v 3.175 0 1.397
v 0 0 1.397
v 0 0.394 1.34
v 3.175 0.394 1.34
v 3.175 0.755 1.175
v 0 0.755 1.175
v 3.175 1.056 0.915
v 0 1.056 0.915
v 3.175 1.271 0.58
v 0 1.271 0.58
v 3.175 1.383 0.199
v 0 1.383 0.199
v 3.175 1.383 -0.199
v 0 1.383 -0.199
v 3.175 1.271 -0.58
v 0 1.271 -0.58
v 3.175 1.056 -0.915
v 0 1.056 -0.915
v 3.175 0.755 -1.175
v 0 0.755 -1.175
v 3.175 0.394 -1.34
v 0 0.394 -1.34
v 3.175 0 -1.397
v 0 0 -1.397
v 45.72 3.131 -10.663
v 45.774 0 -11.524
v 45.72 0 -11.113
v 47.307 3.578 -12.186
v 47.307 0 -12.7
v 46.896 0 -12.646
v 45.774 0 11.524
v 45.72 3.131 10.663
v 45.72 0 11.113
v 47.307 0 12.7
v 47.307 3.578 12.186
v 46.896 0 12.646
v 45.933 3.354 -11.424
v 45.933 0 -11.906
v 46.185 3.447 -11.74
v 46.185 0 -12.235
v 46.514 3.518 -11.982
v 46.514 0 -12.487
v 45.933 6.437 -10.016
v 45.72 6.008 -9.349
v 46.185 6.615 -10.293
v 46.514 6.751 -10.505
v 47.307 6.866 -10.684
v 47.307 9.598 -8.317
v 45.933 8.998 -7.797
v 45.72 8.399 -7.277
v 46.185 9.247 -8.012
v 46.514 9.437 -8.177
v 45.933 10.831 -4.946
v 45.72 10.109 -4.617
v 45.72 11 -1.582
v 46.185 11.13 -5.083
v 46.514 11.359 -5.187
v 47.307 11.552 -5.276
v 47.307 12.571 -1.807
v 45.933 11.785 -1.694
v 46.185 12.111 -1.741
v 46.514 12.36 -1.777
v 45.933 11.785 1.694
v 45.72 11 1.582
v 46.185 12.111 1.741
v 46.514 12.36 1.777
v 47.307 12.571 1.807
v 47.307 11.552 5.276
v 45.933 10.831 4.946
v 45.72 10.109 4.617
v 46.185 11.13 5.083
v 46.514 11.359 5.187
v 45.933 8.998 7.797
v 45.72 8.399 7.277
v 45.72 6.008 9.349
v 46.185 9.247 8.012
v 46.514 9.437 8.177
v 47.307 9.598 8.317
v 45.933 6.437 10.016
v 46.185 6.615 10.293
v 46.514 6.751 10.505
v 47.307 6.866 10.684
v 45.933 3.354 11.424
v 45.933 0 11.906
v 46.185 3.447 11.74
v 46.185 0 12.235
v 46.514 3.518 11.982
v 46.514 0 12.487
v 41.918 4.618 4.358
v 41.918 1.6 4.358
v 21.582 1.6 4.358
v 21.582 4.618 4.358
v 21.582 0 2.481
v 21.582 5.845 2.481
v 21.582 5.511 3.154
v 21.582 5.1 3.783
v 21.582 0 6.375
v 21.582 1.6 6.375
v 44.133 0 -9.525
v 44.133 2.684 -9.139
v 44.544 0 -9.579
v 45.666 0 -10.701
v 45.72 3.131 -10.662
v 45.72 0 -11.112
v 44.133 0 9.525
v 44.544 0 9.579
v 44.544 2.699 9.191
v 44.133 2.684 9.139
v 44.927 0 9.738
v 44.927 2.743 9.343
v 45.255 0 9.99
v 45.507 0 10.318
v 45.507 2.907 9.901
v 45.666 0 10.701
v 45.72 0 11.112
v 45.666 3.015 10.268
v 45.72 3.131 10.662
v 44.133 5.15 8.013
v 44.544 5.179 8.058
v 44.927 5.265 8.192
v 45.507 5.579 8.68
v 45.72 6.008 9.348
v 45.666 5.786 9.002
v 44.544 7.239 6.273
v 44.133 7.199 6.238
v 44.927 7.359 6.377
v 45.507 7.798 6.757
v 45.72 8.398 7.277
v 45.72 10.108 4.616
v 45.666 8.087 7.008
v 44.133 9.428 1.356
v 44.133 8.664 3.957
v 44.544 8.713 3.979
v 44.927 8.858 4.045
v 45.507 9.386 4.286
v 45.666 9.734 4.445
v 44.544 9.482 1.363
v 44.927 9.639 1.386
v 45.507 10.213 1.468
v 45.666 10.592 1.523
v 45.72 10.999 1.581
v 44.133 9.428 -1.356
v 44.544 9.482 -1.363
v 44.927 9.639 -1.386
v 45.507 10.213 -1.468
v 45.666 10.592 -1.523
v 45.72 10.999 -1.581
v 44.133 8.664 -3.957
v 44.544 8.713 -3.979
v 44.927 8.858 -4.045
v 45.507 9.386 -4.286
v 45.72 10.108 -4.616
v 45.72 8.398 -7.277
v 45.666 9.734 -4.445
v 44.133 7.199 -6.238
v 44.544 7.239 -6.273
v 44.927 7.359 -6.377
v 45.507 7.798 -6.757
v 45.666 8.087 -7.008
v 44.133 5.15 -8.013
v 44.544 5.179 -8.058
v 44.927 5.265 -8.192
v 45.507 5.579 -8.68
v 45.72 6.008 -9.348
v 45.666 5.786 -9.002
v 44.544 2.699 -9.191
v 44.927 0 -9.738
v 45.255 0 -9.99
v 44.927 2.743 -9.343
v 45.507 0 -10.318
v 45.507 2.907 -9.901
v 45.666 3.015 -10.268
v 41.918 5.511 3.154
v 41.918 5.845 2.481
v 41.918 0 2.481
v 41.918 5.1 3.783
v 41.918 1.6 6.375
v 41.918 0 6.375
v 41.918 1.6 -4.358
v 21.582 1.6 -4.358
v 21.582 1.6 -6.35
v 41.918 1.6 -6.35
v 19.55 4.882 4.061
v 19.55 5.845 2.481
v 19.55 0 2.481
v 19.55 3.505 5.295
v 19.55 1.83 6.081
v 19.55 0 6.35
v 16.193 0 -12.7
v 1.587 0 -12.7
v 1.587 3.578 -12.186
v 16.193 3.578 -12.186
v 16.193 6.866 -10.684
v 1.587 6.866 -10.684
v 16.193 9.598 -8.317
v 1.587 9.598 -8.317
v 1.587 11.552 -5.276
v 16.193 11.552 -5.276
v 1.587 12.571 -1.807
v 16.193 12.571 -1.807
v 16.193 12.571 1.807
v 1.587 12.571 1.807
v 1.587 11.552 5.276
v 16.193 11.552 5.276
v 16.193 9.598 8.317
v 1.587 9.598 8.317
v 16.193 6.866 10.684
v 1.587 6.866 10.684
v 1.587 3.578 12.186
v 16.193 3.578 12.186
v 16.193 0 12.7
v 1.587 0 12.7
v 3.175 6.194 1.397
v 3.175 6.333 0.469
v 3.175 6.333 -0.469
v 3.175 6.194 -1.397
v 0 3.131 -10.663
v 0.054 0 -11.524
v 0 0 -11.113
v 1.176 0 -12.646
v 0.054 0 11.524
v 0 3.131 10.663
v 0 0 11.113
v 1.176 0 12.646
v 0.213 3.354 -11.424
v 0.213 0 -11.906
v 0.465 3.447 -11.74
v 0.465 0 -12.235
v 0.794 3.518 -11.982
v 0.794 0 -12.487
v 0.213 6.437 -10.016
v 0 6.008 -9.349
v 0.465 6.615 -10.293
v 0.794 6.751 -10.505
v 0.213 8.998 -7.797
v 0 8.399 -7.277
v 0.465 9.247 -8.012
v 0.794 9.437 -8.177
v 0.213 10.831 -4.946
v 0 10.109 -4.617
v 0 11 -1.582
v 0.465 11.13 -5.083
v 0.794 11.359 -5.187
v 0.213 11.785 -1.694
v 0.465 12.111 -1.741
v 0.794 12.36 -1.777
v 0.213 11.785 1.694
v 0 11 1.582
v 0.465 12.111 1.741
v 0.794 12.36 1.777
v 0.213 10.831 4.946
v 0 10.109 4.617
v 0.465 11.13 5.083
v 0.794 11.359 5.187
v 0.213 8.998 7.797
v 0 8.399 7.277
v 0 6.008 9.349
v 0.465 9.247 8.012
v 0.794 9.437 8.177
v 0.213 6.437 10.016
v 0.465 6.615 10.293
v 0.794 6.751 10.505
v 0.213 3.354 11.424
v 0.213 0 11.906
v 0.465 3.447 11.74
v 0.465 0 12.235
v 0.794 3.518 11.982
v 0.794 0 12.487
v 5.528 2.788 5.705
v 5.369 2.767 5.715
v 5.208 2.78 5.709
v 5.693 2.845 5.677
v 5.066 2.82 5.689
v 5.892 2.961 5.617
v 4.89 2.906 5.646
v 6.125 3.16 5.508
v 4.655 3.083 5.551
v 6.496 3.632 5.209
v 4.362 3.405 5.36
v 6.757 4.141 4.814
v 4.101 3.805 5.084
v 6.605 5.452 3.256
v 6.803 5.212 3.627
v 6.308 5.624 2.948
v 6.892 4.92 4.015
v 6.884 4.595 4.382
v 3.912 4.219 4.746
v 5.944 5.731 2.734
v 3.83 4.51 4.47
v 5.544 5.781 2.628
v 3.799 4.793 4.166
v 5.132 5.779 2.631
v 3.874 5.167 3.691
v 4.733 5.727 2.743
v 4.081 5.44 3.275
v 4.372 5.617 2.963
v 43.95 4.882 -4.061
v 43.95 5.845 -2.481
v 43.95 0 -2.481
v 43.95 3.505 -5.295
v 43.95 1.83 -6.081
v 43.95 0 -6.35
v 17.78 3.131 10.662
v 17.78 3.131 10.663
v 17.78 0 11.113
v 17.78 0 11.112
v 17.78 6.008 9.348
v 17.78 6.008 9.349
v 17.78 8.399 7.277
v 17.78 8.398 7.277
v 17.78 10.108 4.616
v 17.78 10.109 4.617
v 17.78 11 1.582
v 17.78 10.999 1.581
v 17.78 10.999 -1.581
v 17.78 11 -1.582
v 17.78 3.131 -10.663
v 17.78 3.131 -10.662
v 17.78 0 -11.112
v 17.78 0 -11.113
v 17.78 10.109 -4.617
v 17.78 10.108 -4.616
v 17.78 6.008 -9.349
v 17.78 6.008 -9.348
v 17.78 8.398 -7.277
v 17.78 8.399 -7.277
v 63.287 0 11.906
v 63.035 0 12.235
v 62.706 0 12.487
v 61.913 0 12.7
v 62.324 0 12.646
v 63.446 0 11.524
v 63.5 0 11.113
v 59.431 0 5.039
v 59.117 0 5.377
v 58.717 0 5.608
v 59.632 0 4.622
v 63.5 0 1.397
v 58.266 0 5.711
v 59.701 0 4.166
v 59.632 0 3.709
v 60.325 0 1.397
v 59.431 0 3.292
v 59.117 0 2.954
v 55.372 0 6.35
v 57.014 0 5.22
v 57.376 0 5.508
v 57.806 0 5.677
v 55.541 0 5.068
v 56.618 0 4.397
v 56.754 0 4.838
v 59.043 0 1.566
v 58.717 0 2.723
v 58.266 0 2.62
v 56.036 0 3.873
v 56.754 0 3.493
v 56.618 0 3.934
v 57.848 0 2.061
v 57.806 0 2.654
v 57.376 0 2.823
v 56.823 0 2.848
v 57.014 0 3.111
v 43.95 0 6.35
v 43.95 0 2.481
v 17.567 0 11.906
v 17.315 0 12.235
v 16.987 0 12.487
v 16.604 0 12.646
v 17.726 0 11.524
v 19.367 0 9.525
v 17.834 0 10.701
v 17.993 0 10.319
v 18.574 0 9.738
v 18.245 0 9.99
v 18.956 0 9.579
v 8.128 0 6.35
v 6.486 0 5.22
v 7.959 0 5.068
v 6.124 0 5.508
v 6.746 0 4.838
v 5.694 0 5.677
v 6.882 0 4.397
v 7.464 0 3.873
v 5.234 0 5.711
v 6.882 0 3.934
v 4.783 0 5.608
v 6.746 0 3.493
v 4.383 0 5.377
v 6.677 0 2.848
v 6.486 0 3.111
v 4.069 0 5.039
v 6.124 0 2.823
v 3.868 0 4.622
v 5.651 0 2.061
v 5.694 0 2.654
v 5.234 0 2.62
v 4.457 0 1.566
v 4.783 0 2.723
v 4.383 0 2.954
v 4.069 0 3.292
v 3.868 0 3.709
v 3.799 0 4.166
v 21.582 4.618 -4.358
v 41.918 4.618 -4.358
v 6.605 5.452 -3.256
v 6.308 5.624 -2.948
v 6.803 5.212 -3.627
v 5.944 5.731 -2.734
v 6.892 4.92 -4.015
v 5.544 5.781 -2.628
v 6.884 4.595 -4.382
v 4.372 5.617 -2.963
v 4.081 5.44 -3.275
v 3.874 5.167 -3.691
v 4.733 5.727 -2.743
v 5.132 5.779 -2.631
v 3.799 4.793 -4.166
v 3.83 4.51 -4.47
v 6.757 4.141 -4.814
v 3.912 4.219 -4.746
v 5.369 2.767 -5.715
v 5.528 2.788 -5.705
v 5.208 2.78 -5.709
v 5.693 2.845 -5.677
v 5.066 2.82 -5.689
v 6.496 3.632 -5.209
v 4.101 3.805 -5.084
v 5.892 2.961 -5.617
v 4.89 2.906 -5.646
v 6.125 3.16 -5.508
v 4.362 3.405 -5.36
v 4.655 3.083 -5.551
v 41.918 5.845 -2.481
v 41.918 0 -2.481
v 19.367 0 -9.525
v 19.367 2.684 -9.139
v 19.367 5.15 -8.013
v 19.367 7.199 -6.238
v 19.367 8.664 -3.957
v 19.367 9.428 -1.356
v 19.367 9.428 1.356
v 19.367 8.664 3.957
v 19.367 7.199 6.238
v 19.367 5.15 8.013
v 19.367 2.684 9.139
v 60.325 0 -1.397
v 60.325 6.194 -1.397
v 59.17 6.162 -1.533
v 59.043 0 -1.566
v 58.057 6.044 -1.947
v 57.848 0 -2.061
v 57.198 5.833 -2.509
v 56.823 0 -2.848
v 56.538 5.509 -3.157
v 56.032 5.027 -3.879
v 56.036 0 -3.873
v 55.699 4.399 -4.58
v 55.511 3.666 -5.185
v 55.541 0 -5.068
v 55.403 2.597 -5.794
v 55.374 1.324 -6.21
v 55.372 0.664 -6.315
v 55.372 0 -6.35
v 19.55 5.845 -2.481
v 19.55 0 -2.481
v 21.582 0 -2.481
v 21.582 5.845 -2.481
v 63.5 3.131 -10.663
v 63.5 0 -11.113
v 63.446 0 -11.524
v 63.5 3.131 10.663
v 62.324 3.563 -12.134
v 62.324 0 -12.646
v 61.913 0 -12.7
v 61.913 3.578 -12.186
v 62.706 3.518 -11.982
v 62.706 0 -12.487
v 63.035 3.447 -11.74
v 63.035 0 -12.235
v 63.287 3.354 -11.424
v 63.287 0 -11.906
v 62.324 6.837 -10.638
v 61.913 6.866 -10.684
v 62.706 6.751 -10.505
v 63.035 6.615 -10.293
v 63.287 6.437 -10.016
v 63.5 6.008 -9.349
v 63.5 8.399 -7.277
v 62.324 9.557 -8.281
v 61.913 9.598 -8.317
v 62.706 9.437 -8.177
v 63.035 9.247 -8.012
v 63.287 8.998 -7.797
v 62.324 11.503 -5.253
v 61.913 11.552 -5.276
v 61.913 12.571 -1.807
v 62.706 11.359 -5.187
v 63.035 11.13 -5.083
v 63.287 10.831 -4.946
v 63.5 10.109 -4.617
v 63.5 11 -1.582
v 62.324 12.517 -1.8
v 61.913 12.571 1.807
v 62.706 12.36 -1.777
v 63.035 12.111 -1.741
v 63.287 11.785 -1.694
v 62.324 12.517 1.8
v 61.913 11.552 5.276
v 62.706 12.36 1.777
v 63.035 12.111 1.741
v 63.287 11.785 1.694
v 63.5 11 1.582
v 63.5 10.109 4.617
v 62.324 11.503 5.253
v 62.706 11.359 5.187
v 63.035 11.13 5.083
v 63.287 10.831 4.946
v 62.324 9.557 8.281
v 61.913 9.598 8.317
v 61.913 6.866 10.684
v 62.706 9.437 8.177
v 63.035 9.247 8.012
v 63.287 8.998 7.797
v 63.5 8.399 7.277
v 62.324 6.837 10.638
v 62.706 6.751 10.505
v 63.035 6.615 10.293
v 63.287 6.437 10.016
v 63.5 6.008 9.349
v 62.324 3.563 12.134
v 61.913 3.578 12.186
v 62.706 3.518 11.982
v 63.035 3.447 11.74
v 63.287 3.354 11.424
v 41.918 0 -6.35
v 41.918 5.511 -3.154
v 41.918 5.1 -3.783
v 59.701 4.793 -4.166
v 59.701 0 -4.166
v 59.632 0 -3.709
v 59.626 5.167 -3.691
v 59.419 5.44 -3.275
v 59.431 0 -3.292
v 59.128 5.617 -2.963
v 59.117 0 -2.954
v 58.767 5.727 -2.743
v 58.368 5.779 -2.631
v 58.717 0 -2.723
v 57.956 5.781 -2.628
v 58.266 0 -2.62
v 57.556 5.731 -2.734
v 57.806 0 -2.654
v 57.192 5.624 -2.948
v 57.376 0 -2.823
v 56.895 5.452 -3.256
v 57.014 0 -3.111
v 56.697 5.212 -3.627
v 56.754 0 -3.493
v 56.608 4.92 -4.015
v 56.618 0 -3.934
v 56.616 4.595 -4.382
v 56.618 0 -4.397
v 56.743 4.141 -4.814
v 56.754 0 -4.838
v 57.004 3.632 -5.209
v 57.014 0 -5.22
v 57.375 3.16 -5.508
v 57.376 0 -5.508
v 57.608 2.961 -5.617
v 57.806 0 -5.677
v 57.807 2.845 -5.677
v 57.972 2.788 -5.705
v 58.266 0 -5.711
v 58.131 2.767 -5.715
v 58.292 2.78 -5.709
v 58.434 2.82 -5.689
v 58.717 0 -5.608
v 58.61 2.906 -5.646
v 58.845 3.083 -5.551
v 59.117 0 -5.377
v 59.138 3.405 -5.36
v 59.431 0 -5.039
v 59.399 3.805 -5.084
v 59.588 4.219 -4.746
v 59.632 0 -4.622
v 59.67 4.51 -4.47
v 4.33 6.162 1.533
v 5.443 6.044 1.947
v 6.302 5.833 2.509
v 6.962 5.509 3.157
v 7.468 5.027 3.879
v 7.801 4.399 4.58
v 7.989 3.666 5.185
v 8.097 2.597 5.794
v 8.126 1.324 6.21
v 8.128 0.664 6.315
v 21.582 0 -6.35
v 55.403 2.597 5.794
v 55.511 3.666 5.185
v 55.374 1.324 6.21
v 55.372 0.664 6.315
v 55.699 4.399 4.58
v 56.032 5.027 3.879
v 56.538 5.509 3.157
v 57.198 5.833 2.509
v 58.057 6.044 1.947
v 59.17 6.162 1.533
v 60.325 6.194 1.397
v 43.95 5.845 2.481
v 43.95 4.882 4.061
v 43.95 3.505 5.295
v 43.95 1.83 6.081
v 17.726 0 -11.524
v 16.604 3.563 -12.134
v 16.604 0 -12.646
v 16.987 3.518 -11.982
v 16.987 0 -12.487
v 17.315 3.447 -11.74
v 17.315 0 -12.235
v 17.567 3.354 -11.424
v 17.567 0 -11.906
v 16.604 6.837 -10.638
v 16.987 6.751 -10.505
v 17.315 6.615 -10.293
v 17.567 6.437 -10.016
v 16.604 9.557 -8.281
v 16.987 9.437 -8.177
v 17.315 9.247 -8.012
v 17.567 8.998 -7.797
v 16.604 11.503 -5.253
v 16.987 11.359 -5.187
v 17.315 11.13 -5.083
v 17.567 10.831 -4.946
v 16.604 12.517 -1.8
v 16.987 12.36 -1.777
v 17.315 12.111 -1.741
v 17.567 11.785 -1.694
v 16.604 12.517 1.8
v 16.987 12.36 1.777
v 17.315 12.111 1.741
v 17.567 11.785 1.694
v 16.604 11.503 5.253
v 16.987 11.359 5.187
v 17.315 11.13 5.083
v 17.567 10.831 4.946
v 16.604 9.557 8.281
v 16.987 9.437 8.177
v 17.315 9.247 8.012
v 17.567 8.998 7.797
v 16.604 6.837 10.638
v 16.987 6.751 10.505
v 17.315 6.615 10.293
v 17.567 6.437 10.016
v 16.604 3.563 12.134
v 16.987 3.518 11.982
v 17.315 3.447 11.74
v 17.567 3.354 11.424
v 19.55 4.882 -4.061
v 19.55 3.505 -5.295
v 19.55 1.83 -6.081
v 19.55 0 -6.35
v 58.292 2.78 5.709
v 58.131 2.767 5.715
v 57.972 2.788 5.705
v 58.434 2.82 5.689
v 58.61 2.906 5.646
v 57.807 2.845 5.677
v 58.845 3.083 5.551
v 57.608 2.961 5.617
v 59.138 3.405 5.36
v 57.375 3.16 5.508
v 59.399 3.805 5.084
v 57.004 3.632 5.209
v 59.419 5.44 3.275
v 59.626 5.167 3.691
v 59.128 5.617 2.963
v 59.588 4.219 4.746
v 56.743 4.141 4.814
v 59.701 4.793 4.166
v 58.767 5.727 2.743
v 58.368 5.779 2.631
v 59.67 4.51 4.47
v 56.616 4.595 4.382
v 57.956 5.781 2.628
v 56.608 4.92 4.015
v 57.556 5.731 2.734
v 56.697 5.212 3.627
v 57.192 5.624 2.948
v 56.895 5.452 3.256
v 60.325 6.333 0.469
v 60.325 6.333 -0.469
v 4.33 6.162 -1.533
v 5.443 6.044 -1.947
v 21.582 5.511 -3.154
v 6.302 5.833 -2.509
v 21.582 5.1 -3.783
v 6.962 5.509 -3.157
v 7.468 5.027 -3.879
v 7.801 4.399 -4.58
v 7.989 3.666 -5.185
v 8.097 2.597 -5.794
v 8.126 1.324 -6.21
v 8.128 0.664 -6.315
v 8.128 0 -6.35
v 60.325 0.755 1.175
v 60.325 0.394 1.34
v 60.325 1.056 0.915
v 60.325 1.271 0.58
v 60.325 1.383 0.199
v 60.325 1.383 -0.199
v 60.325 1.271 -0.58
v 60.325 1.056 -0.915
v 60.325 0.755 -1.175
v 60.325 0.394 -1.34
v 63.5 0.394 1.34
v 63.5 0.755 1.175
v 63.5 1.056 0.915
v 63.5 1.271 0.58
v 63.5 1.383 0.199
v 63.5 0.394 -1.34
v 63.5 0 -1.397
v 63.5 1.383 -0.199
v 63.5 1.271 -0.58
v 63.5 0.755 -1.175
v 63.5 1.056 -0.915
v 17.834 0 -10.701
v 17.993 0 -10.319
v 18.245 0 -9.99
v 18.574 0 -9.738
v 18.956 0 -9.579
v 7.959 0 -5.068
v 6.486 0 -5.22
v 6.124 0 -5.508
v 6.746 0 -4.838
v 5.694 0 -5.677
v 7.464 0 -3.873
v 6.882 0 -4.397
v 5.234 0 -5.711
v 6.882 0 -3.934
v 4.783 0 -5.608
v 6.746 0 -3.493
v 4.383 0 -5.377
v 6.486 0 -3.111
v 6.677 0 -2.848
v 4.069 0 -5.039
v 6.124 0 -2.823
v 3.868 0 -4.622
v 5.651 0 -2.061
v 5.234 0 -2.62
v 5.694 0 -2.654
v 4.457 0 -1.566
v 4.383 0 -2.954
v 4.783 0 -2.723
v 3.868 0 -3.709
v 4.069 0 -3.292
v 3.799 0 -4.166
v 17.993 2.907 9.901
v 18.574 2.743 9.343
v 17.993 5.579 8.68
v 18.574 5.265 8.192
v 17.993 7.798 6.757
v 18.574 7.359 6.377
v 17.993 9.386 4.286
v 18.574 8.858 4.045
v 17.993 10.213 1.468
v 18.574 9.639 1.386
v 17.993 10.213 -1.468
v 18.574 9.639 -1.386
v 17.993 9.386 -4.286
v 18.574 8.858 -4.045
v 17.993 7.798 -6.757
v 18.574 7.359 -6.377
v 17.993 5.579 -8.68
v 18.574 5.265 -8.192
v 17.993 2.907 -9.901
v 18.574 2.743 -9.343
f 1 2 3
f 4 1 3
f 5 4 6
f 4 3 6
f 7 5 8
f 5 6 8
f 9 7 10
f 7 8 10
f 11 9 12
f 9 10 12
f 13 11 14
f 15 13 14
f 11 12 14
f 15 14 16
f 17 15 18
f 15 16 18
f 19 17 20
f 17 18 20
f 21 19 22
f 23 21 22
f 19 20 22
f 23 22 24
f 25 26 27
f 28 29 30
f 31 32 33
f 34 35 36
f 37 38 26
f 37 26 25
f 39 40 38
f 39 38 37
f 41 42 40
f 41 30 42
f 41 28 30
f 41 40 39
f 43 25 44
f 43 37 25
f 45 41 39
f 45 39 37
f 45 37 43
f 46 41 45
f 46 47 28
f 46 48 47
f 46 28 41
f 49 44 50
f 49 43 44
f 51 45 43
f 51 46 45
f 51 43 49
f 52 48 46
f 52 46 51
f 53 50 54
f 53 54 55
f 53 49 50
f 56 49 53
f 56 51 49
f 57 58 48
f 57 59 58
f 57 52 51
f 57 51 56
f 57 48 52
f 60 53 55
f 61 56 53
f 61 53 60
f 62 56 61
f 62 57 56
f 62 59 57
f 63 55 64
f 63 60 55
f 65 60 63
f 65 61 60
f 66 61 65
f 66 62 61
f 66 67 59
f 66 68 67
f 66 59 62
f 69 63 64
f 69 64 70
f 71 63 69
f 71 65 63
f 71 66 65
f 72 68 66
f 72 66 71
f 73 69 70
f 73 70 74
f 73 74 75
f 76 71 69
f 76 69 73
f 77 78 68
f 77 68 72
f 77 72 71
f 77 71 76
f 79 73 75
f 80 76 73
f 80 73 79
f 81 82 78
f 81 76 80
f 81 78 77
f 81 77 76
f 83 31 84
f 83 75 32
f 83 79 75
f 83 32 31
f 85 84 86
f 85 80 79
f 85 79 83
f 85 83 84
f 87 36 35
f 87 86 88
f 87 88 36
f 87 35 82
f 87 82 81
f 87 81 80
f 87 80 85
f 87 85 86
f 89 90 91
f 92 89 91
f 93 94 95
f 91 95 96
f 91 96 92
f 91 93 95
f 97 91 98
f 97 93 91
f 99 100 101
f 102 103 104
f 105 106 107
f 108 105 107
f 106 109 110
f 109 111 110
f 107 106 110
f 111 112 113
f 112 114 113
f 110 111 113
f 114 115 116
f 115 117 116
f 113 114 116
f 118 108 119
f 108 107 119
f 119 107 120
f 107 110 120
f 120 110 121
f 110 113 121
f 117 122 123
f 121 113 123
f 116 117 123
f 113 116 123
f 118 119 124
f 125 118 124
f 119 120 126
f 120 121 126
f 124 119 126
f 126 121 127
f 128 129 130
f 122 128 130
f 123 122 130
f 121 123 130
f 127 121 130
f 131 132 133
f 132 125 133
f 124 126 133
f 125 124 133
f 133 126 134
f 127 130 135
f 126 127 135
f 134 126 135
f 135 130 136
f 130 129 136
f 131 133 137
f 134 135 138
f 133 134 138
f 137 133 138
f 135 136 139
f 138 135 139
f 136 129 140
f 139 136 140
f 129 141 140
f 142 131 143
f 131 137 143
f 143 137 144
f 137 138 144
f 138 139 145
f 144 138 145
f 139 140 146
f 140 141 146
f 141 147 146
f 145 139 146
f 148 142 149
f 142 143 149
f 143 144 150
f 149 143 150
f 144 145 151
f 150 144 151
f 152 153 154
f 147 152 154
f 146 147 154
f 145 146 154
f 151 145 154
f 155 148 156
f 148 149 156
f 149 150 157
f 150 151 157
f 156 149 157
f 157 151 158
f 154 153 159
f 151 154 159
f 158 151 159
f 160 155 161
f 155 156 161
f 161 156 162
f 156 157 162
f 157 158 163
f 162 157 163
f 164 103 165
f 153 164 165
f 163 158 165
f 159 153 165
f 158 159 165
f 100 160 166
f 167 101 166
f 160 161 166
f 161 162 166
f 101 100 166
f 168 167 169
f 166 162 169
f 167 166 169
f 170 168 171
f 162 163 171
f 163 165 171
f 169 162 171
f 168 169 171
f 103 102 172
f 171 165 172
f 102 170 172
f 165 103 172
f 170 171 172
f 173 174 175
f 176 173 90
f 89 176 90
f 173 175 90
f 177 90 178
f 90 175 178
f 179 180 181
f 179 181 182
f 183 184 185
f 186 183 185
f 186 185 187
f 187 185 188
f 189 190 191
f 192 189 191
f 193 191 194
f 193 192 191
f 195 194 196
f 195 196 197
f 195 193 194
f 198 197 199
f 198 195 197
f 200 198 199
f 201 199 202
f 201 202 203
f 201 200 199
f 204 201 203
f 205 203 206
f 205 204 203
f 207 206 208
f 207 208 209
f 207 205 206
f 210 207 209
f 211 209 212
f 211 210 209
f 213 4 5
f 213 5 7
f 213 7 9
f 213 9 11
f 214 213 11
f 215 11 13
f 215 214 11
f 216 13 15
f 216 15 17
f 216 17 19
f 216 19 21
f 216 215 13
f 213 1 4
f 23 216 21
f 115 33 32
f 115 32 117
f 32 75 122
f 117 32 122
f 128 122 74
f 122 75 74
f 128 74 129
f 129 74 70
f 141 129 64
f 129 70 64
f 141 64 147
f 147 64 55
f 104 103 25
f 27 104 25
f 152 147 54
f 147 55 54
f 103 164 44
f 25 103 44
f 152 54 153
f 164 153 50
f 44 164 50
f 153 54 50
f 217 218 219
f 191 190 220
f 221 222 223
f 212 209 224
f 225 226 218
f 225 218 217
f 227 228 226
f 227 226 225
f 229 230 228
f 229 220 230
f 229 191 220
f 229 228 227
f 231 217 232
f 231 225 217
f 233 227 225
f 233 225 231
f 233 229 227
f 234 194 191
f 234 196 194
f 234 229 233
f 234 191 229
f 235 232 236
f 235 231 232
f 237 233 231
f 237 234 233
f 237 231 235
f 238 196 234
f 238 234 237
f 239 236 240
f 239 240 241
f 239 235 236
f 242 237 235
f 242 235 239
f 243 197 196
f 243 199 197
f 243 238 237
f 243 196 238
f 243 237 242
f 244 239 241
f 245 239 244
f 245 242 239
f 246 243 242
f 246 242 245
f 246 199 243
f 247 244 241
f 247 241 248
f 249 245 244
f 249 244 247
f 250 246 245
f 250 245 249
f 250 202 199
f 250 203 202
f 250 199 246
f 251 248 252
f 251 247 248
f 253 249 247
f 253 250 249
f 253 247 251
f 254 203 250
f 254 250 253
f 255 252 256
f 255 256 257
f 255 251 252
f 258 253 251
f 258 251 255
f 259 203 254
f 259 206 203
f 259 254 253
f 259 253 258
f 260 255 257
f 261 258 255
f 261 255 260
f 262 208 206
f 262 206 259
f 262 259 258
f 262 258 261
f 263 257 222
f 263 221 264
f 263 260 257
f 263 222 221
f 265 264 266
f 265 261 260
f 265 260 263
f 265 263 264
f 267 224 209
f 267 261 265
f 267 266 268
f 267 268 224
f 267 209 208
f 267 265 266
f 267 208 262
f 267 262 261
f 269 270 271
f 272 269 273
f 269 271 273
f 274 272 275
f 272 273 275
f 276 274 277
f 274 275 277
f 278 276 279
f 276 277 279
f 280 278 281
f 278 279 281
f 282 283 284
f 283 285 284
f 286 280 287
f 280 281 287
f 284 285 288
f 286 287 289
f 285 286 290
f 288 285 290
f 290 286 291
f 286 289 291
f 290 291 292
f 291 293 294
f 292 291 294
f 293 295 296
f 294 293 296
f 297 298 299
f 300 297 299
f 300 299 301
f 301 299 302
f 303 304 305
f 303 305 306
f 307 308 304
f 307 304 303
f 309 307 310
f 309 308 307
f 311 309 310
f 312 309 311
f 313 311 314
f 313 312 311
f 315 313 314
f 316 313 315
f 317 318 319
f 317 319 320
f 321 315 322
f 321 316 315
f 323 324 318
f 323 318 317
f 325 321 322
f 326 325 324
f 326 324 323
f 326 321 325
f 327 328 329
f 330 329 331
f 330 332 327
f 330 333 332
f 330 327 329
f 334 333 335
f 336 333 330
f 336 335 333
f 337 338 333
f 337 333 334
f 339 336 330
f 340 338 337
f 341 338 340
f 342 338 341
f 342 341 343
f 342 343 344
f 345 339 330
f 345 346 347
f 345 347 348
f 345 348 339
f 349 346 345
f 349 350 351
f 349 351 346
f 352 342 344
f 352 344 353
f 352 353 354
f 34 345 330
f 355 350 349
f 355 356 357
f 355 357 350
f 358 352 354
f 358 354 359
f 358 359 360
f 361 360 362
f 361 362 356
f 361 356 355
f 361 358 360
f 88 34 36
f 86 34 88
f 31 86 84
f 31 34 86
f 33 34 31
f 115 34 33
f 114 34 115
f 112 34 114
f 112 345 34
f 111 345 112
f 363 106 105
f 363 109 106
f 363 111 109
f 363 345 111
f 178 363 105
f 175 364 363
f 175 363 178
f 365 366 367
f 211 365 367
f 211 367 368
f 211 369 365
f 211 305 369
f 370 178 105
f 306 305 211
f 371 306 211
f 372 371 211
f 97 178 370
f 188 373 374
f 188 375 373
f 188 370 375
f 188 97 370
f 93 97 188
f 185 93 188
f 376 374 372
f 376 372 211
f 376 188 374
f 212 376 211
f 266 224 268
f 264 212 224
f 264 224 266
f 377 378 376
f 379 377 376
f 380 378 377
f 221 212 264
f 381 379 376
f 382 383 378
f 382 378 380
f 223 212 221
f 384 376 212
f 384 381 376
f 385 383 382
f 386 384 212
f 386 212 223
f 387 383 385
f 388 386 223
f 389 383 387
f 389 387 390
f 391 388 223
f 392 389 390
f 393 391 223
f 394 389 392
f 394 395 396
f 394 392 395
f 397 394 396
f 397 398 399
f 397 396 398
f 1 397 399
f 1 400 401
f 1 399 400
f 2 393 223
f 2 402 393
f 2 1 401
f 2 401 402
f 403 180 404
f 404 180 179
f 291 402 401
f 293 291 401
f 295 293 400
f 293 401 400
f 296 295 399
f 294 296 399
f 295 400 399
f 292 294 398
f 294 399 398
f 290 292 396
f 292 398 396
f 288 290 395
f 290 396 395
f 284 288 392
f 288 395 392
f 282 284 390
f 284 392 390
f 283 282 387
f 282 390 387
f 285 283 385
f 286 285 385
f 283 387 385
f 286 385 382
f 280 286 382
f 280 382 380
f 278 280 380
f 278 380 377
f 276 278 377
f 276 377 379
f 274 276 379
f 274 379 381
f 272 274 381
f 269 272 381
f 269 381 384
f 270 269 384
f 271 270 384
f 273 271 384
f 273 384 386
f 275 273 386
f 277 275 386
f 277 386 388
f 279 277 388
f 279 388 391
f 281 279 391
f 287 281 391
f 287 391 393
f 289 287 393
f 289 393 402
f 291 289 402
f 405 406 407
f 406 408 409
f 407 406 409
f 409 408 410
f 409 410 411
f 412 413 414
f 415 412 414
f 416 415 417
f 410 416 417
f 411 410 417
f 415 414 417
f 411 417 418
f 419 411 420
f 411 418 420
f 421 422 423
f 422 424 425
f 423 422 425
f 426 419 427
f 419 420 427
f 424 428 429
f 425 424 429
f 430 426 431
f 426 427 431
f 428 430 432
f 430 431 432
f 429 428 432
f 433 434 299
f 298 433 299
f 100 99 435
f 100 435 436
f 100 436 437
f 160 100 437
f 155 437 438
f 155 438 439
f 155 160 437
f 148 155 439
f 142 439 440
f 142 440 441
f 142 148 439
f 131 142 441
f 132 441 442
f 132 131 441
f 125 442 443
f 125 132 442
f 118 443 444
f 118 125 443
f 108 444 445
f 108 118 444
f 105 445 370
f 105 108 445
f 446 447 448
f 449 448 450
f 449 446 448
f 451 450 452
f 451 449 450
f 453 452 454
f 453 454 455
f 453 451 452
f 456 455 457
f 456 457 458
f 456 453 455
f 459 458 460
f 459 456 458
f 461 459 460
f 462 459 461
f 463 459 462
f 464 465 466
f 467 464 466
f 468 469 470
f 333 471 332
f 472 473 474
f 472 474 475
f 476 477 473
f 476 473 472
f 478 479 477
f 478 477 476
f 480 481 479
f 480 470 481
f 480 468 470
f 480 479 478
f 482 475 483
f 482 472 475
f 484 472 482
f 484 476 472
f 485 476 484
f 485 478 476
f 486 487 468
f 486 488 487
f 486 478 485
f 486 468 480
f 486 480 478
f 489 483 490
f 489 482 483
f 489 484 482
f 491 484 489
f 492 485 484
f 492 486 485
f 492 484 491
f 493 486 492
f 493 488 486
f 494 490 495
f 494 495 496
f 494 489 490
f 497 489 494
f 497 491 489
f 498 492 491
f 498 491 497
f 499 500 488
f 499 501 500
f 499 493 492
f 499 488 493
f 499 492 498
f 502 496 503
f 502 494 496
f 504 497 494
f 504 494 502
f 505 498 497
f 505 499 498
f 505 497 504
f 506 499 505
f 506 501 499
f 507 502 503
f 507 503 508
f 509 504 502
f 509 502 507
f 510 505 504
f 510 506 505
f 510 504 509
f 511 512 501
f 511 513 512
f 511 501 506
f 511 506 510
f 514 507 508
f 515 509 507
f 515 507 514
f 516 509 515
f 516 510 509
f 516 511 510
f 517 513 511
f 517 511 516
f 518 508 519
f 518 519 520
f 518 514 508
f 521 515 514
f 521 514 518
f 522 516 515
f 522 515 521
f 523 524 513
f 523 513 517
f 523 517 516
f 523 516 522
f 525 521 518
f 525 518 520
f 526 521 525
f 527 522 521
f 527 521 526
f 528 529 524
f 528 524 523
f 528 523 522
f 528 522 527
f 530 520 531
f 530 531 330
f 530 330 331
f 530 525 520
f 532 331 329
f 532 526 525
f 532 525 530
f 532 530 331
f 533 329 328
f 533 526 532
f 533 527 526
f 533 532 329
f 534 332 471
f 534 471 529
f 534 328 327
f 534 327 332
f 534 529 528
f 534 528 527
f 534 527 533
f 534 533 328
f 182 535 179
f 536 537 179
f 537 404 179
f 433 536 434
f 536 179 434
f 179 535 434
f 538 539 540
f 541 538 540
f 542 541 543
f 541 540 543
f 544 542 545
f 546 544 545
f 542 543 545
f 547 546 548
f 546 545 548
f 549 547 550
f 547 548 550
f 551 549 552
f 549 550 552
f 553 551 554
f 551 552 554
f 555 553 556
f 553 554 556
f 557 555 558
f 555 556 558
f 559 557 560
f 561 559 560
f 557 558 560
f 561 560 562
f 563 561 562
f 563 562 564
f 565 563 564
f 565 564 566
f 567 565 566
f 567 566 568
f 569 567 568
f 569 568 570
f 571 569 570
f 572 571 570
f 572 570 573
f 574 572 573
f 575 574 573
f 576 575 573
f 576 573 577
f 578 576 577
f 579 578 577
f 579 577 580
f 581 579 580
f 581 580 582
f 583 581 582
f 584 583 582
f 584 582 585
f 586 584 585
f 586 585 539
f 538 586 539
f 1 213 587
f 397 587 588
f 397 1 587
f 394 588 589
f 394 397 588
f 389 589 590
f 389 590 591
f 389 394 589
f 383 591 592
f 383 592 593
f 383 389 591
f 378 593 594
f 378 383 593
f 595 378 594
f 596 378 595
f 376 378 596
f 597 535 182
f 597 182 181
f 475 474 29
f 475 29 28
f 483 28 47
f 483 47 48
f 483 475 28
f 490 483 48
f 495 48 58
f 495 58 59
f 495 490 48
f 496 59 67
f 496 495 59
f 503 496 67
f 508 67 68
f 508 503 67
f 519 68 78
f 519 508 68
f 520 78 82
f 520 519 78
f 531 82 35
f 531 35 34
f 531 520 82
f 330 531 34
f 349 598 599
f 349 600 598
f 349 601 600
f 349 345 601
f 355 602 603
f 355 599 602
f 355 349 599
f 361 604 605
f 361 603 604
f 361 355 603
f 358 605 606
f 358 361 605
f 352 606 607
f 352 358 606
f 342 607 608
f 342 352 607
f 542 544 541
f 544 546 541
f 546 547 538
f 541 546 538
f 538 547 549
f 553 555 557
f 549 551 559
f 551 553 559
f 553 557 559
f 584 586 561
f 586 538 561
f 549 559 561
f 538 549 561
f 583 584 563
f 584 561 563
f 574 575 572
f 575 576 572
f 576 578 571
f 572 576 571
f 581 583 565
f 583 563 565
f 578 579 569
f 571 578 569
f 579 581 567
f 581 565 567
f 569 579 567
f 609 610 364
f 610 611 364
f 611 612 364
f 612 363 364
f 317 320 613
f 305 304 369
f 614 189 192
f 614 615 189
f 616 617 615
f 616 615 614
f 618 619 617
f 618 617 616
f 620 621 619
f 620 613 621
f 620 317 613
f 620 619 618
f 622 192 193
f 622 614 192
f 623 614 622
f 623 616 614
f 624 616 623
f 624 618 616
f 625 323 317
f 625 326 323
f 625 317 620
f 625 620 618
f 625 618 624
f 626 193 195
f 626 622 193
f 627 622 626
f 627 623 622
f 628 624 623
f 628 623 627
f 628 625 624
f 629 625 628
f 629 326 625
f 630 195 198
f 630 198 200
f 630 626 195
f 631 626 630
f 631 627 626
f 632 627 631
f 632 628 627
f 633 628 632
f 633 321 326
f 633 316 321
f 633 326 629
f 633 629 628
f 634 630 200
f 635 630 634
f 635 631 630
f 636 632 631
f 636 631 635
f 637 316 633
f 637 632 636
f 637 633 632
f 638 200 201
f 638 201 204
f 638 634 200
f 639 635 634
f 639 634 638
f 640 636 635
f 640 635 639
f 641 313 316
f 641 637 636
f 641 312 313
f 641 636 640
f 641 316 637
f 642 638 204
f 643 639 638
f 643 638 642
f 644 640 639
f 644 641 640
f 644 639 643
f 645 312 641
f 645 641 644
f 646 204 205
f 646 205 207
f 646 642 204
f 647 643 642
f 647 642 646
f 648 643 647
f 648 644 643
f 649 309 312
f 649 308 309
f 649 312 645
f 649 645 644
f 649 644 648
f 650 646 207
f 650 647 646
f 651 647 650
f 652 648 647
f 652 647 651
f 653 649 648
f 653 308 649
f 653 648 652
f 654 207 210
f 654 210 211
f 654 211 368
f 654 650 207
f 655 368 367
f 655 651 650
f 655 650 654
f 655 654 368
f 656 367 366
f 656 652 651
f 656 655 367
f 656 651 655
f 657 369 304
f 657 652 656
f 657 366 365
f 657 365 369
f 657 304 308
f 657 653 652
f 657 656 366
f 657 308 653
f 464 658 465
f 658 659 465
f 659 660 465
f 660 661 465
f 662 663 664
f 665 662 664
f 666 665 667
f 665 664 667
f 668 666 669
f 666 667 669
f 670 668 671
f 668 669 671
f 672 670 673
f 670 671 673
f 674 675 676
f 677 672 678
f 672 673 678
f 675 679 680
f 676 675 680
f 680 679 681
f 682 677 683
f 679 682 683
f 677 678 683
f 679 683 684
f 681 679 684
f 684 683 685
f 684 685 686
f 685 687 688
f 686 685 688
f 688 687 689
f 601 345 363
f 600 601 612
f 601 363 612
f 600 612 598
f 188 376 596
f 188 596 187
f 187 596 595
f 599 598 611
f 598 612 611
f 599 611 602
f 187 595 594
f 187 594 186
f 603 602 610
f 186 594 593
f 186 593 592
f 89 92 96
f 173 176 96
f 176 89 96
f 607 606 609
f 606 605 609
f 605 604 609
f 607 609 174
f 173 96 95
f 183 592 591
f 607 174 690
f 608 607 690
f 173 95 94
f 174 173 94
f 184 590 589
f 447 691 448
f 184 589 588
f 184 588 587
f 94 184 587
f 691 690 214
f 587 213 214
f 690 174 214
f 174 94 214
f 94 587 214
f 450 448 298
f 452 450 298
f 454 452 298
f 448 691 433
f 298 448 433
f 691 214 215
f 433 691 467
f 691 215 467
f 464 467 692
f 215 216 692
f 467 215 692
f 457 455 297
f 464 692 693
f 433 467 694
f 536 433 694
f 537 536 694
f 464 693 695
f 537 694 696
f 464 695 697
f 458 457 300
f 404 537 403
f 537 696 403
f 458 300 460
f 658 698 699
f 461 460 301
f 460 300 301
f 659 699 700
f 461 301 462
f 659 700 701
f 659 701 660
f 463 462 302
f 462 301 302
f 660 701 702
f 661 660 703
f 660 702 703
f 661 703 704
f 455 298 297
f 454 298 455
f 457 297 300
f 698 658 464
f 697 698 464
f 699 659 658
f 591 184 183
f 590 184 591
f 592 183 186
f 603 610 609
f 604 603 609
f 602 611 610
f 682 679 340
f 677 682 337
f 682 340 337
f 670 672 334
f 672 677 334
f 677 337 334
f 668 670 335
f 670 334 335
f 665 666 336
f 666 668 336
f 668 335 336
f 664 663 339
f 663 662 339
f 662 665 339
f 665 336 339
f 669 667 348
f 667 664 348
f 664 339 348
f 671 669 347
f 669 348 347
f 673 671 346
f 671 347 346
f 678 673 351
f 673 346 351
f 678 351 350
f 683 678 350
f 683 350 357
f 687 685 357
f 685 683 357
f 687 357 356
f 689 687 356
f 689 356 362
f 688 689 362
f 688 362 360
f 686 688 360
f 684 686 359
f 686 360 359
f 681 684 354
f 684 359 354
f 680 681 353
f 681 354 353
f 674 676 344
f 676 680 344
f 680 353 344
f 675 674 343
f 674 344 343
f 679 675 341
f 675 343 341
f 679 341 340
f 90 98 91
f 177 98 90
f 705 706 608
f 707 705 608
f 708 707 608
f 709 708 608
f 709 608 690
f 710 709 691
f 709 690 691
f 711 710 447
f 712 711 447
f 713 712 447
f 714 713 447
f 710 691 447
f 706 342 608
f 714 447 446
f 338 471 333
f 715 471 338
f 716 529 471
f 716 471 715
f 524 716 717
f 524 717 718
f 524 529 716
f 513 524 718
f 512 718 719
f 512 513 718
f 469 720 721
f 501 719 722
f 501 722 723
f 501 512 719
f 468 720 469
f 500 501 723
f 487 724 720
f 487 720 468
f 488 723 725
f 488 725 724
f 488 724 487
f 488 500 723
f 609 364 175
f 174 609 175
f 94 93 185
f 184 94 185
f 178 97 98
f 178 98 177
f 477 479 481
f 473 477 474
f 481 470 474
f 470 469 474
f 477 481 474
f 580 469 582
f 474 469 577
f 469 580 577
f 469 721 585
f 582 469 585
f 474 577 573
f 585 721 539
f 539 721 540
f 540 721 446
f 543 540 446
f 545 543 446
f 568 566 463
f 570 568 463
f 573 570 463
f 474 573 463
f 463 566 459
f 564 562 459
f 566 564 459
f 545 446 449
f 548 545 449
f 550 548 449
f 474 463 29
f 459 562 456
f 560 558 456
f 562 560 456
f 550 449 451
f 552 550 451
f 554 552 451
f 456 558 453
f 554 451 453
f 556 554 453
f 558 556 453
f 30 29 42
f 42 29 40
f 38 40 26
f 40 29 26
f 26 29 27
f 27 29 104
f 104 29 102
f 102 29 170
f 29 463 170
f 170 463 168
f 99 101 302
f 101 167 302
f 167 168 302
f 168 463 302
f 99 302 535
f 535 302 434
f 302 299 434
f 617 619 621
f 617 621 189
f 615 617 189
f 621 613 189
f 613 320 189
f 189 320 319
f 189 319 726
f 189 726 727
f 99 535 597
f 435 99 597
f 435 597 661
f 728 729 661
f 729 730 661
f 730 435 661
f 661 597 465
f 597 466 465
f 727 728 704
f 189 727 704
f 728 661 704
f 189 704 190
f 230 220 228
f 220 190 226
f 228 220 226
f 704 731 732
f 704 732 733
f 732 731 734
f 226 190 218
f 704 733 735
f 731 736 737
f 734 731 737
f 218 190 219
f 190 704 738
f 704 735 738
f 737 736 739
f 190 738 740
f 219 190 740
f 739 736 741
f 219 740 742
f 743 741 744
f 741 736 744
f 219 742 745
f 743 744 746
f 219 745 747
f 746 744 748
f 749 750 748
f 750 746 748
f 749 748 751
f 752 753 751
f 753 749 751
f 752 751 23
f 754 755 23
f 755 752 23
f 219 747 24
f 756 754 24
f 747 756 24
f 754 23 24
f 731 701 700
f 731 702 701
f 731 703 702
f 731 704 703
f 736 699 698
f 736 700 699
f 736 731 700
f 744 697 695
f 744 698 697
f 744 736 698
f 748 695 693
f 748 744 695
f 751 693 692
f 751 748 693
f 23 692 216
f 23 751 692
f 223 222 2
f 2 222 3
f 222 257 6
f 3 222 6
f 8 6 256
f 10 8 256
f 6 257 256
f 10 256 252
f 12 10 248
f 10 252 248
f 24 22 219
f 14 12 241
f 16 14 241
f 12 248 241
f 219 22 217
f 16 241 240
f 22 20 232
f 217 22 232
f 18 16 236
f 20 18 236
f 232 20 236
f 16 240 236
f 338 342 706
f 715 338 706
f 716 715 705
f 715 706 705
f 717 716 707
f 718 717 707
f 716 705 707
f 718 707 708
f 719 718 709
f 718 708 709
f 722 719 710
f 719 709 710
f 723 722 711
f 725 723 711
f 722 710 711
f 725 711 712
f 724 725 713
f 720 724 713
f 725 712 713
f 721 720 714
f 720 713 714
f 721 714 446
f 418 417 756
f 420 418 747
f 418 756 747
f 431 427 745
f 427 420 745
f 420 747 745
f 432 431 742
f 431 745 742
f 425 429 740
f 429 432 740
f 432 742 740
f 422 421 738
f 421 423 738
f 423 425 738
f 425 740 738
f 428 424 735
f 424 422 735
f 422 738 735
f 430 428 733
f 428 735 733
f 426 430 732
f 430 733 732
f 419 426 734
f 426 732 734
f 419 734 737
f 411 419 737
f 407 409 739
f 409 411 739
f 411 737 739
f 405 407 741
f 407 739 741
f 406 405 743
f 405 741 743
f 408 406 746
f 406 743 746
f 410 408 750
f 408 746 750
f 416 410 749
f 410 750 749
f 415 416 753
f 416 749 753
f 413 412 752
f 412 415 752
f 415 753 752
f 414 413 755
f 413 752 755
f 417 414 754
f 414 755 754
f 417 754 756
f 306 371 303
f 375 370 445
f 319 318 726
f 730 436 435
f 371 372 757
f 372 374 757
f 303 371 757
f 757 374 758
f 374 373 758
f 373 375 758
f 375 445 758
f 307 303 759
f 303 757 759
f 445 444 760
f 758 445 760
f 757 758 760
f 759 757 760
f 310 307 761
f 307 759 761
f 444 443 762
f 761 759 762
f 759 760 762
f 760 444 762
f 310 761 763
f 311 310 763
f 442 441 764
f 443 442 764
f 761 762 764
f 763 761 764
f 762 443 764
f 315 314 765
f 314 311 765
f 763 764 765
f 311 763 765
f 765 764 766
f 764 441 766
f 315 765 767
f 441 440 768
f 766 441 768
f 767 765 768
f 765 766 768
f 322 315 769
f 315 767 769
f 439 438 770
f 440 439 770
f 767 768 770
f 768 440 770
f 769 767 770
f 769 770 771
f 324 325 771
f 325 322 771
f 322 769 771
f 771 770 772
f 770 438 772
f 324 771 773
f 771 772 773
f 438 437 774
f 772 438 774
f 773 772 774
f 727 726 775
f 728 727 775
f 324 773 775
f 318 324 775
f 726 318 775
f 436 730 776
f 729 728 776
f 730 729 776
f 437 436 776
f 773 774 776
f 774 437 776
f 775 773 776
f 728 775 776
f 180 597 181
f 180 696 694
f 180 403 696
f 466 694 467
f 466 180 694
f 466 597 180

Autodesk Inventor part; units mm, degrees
ref_plane "XZ Plane" through (0, 0, 0) normal (0, 1, 0) x (-1, 0, 0)
ref_plane "XY Plane" through (0, 0, 0) normal (0, 0, 1) x (1, 0, 0)
sketch "Sketch1" plane through (0, 0, 0) normal (0, 1, 0) x (-1, 0, 0)
  line L0 (0, 0) -> (0, -12.7)
  line L1 (0, -12.7) -> (-17.78, -12.7)
  line L2 (-17.78, -12.7) -> (-17.78, -9.525)
  line L3 (-17.78, -9.525) -> (-45.72, -9.525)
  line L4 (-45.72, -9.525) -> (-45.72, -12.7)
  line L5 (-45.72, -12.7) -> (-63.5, -12.7)
  line L6 (-63.5, -12.7) -> (-63.5, 0)
  line L7 (-63.5, 0) -> (-60.325, 0)
  line L8 (-60.325, 0) -> (-60.325, -6.35)
  line L9 (-60.325, -6.35) -> (-3.175, -6.35)
  line L10 (-3.175, -6.35) -> (-3.175, 0)
  line L11 (-3.175, 0) -> (0, 0)
  dimension "d0" = 12.7
  dimension "d1" = 3.175
  dimension "d2" = 17.78
  dimension "d3" = 63.5
  dimension "d4" = 3.175
  dimension "d5" = 3.175
revolve "Revolution1" add sketch "Sketch1" angle 180 about axis through (63.5, 0, 0) along (1, 0, 0)
fillet "Fillet1" radius 1.5875 6 edges at (63.5, 12.7, 0) (17.78, 9.525, 0) (17.78, 12.7, 0) (0, 12.7, 0) (45.72, 9.525, 0) (45.72, 12.7, 0)
sketch "Sketch2" plane through (0, 0, 0) normal (-1, 0, 0) x (0, 0, 1)
  circle A0 centre (0, 0) radius 1.397
  dimension "d8" = 2.794
extrude "Extrusion1" cut sketch "Sketch2" against normal through all
sketch "Sketch3" plane through (3.175, 0, 6.35) normal (0, -1, 0) x (1, 0, 0)
  line L0 (0, 0) -> (57.15, 0) construction
  line L1 (57.15, -12.7) -> (0, -12.7) construction
  line L2 (0, -4.953) -> (0, -7.747) construction
  line L3 (0, -6.35) -> (10.7724, -6.35) construction
  line L4 (10.7724, -6.35) -> (46.1567, -6.35) construction
  line L5 (46.1567, -6.35) -> (56.929, -6.35) construction
  line L6 (0, -12.7) -> (0, 0) projected
  line L7 (28.575, 0) -> (28.575, -12.7) construction
  line L8 (57.15, -7.747) -> (57.15, -4.953) projected
  line L9 (28.575, -10.7083) -> (28.575, -12.7)
  line L10 (57.15, -7.747) -> (28.575, -7.747) construction
  line L11 (28.575, -10.7083) -> (38.743, -10.7083)
  line L12 (40.775, -8.8314) -> (40.775, -12.7)
  line L13 (40.775, -12.7) -> (28.575, -12.7)
  line L14 (28.575, -12.7) -> (28.575, -10.7083)
  line L15 (38.743, -10.7083) -> (38.743, -12.7)
  line L16 (36.4298, -11.4703) -> (36.4298, -10.7083) construction
  line L17 (29.337, -10.5155) -> (28.575, -10.5155) construction
  line L18 (37.981, -10.5156) -> (38.743, -10.5156) construction
  line L19 (38.743, -10.7083) -> (38.743, -8.8314)
  line L20 (38.743, -8.8314) -> (40.775, -8.8314)
  circle A0 centre (54.9756, -10.5155) radius 1.55
  arc A1 (57.15, -7.747) -> (52.197, -12.7) centre (57.15, -12.7) ccw
  line L21 (57.15, -12.7) -> (53.6477, -9.1977) construction
  line L22 (57.15, -7.747) -> (57.15, -12.7)
  line L23 (57.15, -12.7) -> (52.197, -12.7)
  point P0 (-3.175, -6.35)
  dimension "d27" = 2.032
  dimension "d28" = 3.1
extrude "Extrusion3" add sketch "Sketch3" against normal up to next
mirror "Mirror1" about plane through (0, 0, 0) normal (0, 0, 1) of "Extrusion3"
ref_plane "Work Plane1" through (31.75, 0, -9.525) normal (1, 0, 0) x (0, 1, 0)
mirror "Mirror2" about plane through (31.75, 0, -9.525) normal (1, 0, 0) of "Extrusion3", "Mirror1"
sketch "Sketch4" plane through (19.3675, 0, -9.525) normal (0, -1, 0) x (1, 0, 0)
  line L0 (22.5505, 3.175) -> (2.2145, 3.175)
  line L1 (2.2145, 3.175) -> (2.2145, 15.8996)
  line L2 (2.2145, 15.8996) -> (22.5505, 15.8996)
  line L3 (22.5505, 15.8996) -> (22.5505, 3.175)
  point P0 (-19.3675, 9.525)
  point P1 (36.0045, 3.175)
  point P2 (40.9575, 3.175)
  point P3 (24.5825, 7.0436)
extrude "Extrusion4" cut sketch "Sketch4" against normal blind 1.6002
ref_plane "Work Plane2" through (31.75, 0, -9.525) normal (1, 0, 0) x (0, 1, 0)
properties part number "resistor"
